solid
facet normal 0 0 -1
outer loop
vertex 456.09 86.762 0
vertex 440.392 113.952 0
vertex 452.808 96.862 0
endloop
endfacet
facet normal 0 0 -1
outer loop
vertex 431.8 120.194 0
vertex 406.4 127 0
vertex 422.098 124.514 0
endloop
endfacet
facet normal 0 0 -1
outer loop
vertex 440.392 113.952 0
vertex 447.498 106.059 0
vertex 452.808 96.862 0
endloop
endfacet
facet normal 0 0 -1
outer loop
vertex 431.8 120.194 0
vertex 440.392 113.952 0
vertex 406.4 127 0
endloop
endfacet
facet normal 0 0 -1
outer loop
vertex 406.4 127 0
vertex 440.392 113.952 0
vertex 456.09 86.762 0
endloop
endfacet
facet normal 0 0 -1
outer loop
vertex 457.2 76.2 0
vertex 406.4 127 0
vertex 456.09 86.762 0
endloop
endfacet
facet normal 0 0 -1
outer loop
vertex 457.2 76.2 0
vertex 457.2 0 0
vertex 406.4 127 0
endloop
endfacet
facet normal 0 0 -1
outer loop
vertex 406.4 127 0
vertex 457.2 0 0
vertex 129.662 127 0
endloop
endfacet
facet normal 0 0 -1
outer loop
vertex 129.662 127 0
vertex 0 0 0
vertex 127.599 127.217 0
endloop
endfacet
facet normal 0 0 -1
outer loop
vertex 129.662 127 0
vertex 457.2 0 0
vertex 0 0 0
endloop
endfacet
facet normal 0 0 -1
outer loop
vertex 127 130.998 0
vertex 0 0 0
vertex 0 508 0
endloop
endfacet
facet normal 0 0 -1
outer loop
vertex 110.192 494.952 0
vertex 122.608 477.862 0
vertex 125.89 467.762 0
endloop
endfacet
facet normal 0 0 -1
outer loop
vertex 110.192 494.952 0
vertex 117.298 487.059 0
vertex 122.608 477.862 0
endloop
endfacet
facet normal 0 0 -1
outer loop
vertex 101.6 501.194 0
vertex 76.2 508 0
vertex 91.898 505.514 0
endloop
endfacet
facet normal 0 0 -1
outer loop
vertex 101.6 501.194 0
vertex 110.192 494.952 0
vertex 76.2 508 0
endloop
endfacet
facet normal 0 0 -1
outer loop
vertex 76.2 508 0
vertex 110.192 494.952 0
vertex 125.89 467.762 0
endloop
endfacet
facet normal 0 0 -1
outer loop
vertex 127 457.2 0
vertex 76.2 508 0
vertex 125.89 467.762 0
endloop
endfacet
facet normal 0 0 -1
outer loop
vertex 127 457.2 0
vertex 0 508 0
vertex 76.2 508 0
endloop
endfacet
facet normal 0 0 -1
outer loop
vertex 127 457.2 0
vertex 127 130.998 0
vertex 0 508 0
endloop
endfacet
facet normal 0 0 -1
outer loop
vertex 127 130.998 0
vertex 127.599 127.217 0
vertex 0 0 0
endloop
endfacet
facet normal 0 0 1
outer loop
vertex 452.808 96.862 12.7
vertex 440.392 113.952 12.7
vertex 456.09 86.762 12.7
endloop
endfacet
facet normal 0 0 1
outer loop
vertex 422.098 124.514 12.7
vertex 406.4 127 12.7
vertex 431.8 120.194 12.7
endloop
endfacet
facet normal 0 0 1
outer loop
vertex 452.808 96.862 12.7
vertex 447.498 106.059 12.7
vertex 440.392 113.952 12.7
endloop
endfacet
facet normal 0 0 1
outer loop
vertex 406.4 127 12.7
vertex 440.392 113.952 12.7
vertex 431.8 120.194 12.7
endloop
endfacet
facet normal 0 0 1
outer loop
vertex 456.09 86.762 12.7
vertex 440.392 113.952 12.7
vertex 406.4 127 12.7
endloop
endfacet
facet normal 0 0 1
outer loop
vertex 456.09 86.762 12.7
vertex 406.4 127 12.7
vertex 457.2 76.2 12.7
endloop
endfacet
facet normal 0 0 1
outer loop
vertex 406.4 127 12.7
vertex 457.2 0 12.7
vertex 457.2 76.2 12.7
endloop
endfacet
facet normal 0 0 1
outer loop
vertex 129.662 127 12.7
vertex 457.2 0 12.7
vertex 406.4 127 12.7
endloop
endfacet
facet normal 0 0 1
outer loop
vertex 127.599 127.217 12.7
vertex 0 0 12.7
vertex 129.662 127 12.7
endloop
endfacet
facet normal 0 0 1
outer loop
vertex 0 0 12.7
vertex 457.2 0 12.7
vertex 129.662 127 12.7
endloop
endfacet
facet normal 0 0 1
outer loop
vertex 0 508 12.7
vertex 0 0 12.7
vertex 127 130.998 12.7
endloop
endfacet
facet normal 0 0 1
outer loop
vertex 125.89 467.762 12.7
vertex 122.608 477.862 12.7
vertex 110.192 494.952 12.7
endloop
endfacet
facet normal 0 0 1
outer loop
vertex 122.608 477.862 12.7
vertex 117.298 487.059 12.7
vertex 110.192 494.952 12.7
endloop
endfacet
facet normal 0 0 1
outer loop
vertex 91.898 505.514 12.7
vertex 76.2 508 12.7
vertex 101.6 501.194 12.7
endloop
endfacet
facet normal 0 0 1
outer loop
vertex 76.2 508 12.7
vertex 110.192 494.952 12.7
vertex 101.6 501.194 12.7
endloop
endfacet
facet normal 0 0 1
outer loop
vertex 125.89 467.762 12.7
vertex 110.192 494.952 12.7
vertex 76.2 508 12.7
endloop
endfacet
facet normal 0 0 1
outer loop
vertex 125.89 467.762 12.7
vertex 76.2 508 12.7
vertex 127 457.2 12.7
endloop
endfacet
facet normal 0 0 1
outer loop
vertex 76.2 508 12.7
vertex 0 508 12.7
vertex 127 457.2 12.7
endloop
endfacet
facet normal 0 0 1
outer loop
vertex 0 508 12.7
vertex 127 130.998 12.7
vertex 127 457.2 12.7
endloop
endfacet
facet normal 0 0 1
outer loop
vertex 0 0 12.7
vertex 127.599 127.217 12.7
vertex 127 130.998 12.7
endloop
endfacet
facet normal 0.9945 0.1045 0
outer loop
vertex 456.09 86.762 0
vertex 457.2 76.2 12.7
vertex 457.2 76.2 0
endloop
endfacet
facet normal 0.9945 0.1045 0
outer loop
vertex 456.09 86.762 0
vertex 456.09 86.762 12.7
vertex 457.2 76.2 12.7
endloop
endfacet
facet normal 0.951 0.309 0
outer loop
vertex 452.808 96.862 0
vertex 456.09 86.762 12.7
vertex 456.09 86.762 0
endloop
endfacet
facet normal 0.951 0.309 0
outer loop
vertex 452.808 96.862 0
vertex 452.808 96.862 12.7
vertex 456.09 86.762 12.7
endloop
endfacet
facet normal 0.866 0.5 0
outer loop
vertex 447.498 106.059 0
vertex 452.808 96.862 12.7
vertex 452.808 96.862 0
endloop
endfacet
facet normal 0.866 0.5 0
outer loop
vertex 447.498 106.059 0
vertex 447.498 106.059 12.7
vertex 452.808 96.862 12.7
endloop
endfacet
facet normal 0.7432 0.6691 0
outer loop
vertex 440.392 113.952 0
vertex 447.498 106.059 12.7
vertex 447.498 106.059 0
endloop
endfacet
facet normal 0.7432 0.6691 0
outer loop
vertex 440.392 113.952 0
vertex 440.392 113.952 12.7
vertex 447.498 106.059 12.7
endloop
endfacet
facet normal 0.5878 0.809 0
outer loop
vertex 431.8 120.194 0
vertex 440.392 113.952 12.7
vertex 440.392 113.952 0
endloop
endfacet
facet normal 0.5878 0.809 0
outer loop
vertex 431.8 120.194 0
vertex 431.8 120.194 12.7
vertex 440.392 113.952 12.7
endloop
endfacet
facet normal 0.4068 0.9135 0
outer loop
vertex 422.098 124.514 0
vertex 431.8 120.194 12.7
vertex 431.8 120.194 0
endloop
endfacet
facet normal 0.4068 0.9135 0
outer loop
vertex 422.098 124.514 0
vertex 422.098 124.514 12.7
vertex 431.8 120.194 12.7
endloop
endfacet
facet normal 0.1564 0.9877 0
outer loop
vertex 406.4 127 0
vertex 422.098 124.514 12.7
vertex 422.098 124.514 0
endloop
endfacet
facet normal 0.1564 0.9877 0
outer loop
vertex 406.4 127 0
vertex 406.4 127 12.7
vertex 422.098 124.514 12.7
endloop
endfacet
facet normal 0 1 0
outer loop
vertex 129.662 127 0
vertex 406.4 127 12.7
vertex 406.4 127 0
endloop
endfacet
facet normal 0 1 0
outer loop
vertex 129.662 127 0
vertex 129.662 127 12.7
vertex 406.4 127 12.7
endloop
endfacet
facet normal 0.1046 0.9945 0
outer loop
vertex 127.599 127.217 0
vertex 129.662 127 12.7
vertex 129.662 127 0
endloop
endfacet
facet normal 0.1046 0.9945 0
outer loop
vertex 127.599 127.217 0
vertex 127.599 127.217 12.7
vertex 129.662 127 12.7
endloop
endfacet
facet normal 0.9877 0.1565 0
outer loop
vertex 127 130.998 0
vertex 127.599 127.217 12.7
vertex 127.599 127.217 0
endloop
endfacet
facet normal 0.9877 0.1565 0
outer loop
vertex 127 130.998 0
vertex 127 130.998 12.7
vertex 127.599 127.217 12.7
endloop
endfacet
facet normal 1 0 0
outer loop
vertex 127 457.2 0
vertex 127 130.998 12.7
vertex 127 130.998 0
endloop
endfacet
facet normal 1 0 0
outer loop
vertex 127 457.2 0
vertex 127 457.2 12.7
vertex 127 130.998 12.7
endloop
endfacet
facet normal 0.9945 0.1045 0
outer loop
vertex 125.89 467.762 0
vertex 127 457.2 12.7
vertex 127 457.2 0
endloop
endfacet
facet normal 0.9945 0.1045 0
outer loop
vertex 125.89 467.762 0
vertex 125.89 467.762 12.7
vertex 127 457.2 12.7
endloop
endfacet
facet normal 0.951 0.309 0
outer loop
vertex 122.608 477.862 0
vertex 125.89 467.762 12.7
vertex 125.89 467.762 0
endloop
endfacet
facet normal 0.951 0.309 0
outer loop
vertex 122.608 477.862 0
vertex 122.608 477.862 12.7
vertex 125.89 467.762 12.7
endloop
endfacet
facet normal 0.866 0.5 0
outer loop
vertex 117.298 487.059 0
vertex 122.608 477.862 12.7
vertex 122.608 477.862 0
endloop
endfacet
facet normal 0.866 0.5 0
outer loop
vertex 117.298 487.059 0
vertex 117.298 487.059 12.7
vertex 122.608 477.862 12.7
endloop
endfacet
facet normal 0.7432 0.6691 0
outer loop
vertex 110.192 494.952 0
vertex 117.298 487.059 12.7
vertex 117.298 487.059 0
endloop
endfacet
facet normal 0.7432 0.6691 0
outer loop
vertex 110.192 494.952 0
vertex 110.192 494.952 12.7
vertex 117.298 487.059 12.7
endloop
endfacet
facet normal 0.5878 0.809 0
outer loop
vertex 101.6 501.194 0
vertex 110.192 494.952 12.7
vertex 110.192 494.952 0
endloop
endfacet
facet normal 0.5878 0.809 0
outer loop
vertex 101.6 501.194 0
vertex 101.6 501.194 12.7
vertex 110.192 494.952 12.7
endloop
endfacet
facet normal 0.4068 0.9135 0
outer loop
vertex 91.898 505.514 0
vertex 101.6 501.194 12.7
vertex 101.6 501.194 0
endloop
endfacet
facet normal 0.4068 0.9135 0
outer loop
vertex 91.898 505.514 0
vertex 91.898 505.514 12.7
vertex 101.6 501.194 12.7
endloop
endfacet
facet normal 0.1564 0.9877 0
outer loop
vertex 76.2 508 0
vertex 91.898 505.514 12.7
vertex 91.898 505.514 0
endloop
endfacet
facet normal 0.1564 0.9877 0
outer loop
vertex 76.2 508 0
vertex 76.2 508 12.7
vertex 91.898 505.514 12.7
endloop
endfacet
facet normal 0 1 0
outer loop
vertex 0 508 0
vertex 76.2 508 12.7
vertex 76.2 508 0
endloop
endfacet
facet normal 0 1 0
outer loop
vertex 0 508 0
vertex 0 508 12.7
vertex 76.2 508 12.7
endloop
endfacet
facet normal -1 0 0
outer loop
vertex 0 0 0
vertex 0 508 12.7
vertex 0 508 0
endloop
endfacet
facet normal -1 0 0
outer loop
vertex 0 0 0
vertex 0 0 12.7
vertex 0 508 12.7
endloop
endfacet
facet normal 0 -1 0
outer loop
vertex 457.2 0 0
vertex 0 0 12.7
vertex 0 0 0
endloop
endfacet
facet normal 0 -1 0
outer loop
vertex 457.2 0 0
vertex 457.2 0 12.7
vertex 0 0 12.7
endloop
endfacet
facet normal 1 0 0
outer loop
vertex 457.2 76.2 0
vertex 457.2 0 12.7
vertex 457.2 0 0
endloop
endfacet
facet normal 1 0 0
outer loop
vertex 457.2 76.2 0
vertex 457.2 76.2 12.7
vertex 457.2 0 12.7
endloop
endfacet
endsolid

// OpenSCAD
in=25.4;

pad=0.1;

wood=in/2;

module wood(height=wood) {
	linear_extrude(height=height)
	children();
}

module shelf(x,y,x_thick,y_thick,corner) {
	intersection() {
		translate([-corner,-corner])
		offset(corner)
		offset(-corner) {
			square([x+corner,x_thick+corner]);
			square([y_thick+corner,y+corner]);
		}
		square([x+pad,y+pad]);
	}
}

thick=5*in;
wood()
shelf(18*in,20*in,thick,thick,2*in);
